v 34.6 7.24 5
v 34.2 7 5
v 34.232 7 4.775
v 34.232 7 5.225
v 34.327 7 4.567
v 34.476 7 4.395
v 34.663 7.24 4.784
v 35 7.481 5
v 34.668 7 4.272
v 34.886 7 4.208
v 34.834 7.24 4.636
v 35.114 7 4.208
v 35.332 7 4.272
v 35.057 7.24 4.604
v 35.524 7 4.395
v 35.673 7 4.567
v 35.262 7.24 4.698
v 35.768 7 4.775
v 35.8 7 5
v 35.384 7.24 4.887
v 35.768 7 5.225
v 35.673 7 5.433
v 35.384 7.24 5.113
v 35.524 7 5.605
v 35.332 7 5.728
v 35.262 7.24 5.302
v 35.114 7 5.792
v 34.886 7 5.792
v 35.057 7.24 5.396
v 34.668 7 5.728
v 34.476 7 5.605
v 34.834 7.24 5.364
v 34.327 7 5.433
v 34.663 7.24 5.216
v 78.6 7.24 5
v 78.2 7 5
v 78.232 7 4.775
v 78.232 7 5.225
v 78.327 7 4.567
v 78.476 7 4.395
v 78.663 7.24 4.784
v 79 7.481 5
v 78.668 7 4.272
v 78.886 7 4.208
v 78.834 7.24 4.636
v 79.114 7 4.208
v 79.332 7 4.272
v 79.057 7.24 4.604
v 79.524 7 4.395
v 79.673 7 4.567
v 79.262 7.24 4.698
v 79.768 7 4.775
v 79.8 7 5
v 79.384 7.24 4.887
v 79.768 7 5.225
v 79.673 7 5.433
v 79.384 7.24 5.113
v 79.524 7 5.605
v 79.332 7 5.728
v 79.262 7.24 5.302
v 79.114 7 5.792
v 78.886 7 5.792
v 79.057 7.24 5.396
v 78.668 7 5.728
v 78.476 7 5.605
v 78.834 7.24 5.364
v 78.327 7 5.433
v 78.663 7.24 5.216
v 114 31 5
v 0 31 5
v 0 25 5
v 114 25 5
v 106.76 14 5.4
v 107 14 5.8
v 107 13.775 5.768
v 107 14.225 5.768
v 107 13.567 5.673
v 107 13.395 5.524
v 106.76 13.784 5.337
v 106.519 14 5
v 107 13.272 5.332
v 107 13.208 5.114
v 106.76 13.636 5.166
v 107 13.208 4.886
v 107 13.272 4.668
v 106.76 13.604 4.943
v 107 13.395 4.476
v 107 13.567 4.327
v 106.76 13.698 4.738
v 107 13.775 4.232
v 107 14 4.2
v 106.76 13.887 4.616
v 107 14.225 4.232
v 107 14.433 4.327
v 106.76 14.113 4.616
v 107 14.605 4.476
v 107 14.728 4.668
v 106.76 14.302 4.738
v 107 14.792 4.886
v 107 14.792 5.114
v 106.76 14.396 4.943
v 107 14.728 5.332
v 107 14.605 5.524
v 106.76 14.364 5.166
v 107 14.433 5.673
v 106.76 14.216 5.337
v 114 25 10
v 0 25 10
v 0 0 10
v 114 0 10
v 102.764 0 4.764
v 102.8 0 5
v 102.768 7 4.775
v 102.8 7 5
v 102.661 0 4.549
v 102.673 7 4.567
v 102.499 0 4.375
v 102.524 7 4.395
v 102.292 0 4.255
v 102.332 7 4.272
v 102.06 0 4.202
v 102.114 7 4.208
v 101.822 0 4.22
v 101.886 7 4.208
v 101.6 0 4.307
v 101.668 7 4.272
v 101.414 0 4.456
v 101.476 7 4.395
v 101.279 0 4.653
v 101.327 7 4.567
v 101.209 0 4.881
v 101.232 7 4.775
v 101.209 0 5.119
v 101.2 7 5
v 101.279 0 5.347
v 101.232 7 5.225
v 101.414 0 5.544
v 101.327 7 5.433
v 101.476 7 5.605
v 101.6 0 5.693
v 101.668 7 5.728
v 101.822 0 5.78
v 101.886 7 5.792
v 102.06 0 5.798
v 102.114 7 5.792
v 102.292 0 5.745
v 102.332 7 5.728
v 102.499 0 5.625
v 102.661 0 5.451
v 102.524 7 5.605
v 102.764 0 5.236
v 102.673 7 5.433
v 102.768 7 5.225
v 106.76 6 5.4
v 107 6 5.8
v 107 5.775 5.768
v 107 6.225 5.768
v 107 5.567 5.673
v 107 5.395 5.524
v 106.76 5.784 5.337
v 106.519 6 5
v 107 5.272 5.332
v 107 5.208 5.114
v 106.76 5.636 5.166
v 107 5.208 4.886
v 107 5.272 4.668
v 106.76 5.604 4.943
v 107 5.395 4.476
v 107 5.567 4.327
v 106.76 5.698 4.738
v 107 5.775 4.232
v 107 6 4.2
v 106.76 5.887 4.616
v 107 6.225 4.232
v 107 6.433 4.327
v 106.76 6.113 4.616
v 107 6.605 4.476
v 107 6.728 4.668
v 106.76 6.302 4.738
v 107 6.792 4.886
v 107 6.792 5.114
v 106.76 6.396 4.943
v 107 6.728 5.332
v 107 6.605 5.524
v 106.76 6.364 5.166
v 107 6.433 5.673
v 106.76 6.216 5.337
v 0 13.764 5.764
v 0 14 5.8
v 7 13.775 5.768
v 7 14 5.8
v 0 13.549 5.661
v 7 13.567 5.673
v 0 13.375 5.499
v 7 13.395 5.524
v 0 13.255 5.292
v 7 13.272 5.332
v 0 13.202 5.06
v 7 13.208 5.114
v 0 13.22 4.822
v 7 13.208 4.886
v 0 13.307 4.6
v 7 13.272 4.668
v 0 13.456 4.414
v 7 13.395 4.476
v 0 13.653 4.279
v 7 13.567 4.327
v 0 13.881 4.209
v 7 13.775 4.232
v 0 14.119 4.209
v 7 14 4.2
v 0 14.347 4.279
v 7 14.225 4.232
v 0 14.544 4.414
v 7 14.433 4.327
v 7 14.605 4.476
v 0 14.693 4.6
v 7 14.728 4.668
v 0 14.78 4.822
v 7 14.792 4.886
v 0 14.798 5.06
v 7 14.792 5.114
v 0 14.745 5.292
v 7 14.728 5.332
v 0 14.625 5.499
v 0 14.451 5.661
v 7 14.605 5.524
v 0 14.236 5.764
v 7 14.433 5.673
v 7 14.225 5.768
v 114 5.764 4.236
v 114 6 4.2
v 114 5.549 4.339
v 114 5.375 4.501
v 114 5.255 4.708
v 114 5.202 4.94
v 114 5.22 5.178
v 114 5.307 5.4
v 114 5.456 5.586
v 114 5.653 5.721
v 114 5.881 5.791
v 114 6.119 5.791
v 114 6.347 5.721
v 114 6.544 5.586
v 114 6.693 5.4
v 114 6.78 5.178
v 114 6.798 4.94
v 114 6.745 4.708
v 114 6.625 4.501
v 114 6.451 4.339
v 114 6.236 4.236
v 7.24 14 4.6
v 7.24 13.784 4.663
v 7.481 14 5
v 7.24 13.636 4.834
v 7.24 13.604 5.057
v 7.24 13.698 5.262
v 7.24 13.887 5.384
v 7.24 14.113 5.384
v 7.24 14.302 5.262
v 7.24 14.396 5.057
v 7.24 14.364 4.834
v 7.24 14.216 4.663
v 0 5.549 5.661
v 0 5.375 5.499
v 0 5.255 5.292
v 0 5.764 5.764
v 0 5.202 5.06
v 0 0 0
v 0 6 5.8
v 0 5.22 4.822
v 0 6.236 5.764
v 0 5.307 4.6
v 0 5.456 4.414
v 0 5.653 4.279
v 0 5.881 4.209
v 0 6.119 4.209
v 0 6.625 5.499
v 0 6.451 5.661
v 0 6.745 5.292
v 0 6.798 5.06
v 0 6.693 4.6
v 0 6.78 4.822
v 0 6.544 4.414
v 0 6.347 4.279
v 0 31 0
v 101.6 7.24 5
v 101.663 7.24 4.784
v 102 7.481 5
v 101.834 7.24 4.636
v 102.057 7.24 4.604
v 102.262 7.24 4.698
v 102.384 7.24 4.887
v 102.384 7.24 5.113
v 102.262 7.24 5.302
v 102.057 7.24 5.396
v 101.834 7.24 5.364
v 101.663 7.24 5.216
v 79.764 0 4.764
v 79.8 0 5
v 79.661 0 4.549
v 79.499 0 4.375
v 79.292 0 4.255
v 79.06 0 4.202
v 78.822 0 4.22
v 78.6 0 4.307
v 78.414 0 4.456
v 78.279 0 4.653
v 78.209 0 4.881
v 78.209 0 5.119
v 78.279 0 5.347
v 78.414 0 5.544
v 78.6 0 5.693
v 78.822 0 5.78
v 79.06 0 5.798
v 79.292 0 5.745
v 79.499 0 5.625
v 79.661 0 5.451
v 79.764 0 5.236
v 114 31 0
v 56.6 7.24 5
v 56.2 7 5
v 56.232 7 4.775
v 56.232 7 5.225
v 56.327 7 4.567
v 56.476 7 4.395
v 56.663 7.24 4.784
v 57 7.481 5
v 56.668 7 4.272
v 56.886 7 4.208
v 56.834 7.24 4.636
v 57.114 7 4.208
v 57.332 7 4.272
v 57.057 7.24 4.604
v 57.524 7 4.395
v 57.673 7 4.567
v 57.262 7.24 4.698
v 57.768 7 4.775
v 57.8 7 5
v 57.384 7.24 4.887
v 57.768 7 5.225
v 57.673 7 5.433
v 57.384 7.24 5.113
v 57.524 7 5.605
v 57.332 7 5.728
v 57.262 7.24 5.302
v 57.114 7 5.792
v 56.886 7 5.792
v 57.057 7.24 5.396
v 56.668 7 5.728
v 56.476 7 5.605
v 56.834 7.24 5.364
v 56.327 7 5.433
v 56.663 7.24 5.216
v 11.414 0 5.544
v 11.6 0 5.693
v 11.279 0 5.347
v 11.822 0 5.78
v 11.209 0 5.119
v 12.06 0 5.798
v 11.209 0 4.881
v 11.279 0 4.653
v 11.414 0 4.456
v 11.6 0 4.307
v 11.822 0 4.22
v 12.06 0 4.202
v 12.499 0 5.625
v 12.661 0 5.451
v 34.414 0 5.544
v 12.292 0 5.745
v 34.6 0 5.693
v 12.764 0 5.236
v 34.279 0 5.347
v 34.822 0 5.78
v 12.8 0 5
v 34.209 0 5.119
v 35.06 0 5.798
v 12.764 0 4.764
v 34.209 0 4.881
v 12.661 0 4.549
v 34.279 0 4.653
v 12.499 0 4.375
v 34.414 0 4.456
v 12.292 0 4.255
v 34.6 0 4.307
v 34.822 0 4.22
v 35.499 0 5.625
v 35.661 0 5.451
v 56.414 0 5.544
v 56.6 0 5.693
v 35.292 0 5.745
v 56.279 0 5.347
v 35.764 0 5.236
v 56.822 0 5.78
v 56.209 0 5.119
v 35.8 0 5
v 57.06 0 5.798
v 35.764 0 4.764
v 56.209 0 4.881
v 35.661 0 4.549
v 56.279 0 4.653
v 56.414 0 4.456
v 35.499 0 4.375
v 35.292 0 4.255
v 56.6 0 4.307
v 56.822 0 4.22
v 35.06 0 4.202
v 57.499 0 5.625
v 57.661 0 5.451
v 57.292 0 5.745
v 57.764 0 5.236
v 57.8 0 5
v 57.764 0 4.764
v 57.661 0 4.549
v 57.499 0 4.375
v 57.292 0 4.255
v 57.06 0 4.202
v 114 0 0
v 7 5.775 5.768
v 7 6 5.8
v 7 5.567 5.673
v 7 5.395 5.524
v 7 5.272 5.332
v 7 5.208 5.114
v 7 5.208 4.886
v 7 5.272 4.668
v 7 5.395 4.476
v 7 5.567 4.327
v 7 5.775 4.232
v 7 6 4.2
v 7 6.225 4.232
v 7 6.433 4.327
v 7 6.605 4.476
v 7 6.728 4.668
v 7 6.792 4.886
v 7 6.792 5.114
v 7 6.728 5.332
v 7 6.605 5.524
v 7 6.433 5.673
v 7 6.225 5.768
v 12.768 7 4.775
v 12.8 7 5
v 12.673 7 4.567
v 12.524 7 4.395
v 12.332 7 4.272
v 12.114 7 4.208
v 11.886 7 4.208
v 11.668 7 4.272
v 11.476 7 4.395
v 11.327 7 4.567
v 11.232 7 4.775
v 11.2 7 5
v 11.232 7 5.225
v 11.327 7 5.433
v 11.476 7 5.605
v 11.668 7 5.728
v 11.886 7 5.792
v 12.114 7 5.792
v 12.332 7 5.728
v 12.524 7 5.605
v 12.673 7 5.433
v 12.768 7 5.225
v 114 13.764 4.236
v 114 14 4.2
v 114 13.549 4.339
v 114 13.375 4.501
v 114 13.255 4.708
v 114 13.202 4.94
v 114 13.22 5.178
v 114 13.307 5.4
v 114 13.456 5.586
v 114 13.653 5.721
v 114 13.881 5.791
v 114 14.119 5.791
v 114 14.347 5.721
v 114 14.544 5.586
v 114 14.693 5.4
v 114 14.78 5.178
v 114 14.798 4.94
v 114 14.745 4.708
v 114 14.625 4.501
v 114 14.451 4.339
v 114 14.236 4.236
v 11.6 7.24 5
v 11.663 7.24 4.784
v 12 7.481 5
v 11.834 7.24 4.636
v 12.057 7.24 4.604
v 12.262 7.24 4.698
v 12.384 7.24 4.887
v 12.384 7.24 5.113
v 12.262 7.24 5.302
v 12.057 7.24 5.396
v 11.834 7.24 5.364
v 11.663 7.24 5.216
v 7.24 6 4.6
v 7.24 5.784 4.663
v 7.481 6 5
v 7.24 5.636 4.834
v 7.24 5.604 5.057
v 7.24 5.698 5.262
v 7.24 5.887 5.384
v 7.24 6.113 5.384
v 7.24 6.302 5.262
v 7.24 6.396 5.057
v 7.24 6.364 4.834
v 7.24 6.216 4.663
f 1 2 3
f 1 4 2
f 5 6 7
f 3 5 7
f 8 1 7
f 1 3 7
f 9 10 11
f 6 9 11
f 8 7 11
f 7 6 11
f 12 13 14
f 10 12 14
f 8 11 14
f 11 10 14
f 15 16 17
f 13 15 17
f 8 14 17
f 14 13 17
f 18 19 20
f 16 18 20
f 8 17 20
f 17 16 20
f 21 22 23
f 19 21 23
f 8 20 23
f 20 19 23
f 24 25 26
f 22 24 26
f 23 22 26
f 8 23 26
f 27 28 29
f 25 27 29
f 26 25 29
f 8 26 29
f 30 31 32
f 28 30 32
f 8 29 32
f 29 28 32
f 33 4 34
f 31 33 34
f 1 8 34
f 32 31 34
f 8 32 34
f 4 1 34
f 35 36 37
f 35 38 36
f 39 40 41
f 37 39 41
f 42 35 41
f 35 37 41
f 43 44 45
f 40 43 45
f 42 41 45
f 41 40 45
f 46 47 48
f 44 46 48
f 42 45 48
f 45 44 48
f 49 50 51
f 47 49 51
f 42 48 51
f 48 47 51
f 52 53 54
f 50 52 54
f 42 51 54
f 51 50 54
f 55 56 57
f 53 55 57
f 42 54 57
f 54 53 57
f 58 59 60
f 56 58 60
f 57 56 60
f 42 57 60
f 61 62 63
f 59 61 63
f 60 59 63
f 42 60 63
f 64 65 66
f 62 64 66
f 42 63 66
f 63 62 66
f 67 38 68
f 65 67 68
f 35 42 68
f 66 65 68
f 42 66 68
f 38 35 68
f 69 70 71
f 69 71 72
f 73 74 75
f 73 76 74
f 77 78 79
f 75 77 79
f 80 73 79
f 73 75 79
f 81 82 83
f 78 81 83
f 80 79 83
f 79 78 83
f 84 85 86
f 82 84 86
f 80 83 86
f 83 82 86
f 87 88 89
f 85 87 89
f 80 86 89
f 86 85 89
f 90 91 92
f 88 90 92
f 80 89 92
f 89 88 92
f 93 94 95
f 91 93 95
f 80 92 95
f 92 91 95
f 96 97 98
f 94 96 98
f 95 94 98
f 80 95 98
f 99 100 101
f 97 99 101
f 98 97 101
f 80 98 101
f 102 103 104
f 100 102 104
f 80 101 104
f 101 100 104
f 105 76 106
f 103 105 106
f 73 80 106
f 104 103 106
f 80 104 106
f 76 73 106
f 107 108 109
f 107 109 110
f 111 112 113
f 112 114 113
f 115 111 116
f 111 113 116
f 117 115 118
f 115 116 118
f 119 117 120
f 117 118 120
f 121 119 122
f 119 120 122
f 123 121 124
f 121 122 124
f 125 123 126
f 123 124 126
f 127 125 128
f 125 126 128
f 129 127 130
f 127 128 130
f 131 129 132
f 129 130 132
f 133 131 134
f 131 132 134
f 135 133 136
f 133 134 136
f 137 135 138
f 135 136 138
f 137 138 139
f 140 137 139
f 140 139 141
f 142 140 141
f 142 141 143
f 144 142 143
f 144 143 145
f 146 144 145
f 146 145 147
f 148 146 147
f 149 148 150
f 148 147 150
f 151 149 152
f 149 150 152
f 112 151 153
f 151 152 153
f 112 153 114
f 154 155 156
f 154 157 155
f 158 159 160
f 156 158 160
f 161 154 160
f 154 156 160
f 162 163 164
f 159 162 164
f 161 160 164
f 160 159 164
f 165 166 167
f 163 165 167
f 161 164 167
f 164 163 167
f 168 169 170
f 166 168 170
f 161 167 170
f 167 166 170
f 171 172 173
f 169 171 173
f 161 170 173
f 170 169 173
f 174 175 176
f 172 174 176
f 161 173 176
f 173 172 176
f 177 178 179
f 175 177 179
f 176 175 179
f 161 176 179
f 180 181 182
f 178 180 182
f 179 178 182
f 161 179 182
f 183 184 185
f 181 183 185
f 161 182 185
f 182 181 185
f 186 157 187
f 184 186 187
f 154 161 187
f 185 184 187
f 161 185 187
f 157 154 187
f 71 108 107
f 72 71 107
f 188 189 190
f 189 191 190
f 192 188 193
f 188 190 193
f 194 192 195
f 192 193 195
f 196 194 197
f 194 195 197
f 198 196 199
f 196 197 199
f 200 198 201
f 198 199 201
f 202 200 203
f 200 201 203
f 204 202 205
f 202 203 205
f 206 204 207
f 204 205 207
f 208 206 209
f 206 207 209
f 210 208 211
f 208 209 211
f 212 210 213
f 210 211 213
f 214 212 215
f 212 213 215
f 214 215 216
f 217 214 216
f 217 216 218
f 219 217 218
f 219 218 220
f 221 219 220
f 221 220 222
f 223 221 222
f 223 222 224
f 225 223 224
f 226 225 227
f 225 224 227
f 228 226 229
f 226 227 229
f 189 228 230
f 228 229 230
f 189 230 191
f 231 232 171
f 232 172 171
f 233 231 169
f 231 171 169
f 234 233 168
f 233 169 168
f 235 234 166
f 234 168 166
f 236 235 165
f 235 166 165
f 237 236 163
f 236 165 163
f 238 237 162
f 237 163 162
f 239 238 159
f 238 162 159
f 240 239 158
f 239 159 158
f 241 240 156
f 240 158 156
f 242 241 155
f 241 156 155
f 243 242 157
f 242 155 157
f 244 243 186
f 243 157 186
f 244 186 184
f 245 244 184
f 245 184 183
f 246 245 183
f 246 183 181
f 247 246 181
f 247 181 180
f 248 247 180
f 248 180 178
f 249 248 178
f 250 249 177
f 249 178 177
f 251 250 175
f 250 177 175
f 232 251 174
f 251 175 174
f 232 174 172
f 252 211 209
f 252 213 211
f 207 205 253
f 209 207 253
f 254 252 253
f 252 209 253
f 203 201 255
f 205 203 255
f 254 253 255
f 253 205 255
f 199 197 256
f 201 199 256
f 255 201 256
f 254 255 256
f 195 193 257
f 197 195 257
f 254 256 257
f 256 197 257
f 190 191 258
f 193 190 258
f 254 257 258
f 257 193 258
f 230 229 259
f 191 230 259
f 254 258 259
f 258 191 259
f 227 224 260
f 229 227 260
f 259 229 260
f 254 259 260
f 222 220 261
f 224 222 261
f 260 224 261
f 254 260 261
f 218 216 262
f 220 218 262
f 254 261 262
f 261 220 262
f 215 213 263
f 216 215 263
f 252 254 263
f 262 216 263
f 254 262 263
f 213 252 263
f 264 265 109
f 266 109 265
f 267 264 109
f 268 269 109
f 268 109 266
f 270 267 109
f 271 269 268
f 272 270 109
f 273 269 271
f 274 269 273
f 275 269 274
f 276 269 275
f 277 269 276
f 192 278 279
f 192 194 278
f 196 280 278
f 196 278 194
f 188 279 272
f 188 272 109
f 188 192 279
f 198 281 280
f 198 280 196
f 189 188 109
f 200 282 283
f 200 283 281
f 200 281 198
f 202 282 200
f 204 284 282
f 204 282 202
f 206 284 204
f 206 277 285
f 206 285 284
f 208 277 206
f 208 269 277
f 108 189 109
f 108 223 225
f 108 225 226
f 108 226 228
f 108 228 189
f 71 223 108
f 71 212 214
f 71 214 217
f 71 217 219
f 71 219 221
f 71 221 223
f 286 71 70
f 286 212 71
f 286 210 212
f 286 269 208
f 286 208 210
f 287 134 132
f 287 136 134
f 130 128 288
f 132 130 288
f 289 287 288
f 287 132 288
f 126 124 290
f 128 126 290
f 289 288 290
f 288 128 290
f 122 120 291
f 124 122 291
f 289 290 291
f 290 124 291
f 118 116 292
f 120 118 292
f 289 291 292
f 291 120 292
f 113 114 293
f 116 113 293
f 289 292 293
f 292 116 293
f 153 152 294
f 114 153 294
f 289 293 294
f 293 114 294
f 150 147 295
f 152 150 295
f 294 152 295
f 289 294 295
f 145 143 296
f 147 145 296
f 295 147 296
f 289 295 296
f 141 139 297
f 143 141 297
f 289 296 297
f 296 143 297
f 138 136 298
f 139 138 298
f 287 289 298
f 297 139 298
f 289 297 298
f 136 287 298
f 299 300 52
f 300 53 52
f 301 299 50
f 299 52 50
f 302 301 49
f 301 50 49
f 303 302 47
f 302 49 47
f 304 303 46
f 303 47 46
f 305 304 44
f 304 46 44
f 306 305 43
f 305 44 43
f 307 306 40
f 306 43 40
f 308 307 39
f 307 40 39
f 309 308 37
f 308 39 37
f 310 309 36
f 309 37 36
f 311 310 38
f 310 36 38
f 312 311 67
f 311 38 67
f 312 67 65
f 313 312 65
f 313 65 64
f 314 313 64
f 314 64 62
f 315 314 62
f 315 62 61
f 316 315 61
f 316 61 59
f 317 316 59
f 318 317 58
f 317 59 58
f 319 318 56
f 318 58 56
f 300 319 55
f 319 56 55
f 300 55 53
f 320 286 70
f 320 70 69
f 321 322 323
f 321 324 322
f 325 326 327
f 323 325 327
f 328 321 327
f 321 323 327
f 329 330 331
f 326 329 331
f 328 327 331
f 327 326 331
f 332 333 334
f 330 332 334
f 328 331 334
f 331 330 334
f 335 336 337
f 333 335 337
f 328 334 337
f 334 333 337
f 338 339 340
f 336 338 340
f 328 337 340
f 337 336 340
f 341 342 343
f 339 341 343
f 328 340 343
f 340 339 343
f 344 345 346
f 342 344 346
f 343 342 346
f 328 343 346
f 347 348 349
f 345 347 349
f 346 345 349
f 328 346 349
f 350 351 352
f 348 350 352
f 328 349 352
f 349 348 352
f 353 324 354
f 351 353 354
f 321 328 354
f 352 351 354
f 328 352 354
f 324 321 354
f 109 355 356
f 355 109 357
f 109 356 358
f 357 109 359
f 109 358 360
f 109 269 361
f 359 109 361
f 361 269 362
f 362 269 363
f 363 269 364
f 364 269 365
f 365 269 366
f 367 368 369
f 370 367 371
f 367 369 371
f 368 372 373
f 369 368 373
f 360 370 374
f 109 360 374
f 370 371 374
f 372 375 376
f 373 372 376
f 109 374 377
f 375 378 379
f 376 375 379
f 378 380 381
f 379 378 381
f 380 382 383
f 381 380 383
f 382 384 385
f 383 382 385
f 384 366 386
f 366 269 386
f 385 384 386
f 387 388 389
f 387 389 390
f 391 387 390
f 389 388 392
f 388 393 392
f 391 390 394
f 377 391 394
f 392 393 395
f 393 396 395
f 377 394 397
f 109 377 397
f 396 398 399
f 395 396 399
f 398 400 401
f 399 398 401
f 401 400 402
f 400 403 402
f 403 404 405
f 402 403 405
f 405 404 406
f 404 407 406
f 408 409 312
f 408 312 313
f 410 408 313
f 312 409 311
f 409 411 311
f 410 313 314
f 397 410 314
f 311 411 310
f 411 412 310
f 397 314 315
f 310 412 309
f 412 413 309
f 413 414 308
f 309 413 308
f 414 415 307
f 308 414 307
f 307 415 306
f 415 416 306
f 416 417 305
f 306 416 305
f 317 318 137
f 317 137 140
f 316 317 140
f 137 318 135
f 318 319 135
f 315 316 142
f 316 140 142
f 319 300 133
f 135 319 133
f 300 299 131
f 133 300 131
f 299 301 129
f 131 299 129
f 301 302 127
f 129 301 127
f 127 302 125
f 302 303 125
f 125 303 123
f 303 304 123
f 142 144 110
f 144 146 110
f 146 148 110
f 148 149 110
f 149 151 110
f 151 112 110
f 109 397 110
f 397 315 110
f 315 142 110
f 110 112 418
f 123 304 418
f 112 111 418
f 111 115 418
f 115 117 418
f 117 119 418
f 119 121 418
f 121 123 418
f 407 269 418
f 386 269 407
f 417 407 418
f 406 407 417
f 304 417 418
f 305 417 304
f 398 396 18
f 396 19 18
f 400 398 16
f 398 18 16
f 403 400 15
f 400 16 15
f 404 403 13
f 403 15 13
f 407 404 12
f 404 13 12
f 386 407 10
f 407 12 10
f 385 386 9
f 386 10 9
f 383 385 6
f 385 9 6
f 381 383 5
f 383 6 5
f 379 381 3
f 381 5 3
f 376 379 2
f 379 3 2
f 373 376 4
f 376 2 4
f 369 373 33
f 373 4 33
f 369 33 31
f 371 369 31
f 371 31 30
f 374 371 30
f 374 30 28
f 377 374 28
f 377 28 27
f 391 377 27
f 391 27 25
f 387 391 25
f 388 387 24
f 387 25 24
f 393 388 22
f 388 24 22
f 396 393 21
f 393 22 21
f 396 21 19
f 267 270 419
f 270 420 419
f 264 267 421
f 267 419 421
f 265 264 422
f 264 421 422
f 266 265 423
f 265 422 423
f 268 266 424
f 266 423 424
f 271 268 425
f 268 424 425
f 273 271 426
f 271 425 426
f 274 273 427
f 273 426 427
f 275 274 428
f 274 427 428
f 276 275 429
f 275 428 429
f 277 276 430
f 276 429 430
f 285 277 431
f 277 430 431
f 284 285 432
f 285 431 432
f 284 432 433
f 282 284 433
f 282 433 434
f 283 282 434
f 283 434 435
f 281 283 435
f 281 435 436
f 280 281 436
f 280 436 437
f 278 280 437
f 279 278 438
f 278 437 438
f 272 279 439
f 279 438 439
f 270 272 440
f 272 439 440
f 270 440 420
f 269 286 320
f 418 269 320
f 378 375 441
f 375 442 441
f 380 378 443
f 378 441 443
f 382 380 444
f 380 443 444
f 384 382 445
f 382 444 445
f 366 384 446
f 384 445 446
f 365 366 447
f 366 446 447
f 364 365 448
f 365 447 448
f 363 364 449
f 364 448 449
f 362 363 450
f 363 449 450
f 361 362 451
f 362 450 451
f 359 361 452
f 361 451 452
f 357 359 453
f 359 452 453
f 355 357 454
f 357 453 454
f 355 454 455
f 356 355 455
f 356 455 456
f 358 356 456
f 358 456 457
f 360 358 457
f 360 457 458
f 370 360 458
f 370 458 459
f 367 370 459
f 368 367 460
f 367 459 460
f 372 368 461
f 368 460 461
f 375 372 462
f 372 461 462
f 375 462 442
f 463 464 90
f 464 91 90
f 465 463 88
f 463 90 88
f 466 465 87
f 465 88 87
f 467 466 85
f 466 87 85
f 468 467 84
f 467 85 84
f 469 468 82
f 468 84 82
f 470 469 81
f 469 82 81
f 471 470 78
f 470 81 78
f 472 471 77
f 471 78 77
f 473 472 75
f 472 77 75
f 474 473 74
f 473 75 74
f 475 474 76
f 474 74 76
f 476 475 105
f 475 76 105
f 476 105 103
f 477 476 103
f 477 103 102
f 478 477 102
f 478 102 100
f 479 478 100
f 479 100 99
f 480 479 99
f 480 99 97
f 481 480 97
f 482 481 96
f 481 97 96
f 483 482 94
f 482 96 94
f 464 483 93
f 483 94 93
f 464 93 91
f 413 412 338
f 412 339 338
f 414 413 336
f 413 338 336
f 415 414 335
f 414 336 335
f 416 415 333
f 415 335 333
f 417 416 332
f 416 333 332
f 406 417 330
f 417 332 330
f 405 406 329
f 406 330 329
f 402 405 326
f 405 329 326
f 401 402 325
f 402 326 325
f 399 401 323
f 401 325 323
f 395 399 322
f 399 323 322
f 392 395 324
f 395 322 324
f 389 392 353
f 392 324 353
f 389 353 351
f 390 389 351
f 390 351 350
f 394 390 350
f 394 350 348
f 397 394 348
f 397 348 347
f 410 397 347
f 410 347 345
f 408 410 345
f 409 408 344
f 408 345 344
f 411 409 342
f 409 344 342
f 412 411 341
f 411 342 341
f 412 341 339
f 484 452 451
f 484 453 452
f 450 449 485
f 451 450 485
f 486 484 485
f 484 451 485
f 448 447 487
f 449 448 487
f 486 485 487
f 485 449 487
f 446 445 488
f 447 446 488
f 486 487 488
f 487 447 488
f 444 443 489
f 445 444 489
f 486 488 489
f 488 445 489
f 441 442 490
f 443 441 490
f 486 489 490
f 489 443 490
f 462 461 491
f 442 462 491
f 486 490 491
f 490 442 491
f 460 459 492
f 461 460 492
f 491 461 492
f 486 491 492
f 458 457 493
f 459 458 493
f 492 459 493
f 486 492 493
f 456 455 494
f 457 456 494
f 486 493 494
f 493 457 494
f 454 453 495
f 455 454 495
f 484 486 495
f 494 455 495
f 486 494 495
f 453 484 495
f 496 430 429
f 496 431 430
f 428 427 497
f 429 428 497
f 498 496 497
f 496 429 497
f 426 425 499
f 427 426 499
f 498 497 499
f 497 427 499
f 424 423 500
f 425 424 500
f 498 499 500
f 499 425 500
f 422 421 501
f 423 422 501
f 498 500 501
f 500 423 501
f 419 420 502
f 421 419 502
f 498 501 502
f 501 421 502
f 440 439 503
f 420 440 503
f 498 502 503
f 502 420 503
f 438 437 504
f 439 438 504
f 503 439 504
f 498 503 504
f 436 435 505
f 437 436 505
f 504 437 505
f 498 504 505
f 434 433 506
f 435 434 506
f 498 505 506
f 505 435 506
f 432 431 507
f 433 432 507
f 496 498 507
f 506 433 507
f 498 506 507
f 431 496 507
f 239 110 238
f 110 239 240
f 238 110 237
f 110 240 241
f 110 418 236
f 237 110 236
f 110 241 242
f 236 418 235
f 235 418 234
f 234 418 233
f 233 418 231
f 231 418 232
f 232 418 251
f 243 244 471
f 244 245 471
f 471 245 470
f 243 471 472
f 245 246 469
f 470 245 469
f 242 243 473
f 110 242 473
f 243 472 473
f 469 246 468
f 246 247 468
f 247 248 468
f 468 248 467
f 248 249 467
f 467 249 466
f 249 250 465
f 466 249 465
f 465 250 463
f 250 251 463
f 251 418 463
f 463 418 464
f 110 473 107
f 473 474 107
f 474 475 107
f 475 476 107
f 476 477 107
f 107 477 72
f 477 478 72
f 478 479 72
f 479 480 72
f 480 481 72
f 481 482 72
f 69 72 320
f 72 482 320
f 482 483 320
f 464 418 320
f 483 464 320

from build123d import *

# Parameters (mm, degrees)
SKETCH1_W                 = 114
SKETCH1_H                 = 31
BOSS_EXTRUDE1_DEPTH       = 10
SKETCH2_W                 = 114
SKETCH2_H                 = 6
CUT_EXTRUDE1_DEPTH        = 5
M2X0_4_TAPPED_HOLE1_D     = 1.6
M2X0_4_TAPPED_HOLE1_DEPTH = 7
M2X0_4_TAPPED_HOLE1_TIP   = 0.480688495
M2X0_4_TAPPED_HOLE3_D     = 1.6
M2X0_4_TAPPED_HOLE3_DEPTH = 7
M2X0_4_TAPPED_HOLE3_TIP   = 0.480688495
M2X0_4_TAPPED_HOLE2_D     = 1.6
M2X0_4_TAPPED_HOLE2_DEPTH = 7
M2X0_4_TAPPED_HOLE2_TIP   = 0.480688495


with BuildPart() as part:
    # Sketch1 → Boss-Extrude1 (new body)
    with BuildSketch(Plane.XY):
        with Locations((57, 15.5)):
            Rectangle(SKETCH1_W, SKETCH1_H)
    extrude(amount=BOSS_EXTRUDE1_DEPTH)

    # Sketch2 → Cut-Extrude1 (cut)
    with BuildSketch(Plane.XY.offset(10)):
        with Locations((57, 28)):
            Rectangle(SKETCH2_W, SKETCH2_H)
    extrude(amount=-CUT_EXTRUDE1_DEPTH, mode=Mode.SUBTRACT)

    # M2x0.4 Tapped Hole1
    with Locations(Plane(origin=(0, 14, 5), x_dir=(0, 0, -1), z_dir=(-1, 0, 0))):
        with Locations((0, 0), (0, 8)):
            Hole(M2X0_4_TAPPED_HOLE1_D / 2, depth=M2X0_4_TAPPED_HOLE1_DEPTH)
            with Locations((0, 0, -(M2X0_4_TAPPED_HOLE1_DEPTH + M2X0_4_TAPPED_HOLE1_TIP / 2))):  # 118° drill point
                Cone(0, M2X0_4_TAPPED_HOLE1_D / 2, M2X0_4_TAPPED_HOLE1_TIP, mode=Mode.SUBTRACT)

    # M2x0.4 Tapped Hole3
    with Locations(Plane(origin=(114, 14, 5), x_dir=(0, 0, 1), z_dir=(1, 0, 0))):
        with Locations((0, 0), (0, 8)):
            Hole(M2X0_4_TAPPED_HOLE3_D / 2, depth=M2X0_4_TAPPED_HOLE3_DEPTH)
            with Locations((0, 0, -(M2X0_4_TAPPED_HOLE3_DEPTH + M2X0_4_TAPPED_HOLE3_TIP / 2))):  # 118° drill point
                Cone(0, M2X0_4_TAPPED_HOLE3_D / 2, M2X0_4_TAPPED_HOLE3_TIP, mode=Mode.SUBTRACT)

    # M2x0.4 Tapped Hole2
    with Locations(Plane(origin=(0, 0, 0), x_dir=(-1, 0, 0), z_dir=(0, -1, 0))):
        with Locations((-102, -5), (-12, -5), (-57, -5), (-79, -5), (-35, -5)):
            Hole(M2X0_4_TAPPED_HOLE2_D / 2, depth=M2X0_4_TAPPED_HOLE2_DEPTH)
            with Locations((0, 0, -(M2X0_4_TAPPED_HOLE2_DEPTH + M2X0_4_TAPPED_HOLE2_TIP / 2))):  # 118° drill point
                Cone(0, M2X0_4_TAPPED_HOLE2_D / 2, M2X0_4_TAPPED_HOLE2_TIP, mode=Mode.SUBTRACT)


solid = part.part
